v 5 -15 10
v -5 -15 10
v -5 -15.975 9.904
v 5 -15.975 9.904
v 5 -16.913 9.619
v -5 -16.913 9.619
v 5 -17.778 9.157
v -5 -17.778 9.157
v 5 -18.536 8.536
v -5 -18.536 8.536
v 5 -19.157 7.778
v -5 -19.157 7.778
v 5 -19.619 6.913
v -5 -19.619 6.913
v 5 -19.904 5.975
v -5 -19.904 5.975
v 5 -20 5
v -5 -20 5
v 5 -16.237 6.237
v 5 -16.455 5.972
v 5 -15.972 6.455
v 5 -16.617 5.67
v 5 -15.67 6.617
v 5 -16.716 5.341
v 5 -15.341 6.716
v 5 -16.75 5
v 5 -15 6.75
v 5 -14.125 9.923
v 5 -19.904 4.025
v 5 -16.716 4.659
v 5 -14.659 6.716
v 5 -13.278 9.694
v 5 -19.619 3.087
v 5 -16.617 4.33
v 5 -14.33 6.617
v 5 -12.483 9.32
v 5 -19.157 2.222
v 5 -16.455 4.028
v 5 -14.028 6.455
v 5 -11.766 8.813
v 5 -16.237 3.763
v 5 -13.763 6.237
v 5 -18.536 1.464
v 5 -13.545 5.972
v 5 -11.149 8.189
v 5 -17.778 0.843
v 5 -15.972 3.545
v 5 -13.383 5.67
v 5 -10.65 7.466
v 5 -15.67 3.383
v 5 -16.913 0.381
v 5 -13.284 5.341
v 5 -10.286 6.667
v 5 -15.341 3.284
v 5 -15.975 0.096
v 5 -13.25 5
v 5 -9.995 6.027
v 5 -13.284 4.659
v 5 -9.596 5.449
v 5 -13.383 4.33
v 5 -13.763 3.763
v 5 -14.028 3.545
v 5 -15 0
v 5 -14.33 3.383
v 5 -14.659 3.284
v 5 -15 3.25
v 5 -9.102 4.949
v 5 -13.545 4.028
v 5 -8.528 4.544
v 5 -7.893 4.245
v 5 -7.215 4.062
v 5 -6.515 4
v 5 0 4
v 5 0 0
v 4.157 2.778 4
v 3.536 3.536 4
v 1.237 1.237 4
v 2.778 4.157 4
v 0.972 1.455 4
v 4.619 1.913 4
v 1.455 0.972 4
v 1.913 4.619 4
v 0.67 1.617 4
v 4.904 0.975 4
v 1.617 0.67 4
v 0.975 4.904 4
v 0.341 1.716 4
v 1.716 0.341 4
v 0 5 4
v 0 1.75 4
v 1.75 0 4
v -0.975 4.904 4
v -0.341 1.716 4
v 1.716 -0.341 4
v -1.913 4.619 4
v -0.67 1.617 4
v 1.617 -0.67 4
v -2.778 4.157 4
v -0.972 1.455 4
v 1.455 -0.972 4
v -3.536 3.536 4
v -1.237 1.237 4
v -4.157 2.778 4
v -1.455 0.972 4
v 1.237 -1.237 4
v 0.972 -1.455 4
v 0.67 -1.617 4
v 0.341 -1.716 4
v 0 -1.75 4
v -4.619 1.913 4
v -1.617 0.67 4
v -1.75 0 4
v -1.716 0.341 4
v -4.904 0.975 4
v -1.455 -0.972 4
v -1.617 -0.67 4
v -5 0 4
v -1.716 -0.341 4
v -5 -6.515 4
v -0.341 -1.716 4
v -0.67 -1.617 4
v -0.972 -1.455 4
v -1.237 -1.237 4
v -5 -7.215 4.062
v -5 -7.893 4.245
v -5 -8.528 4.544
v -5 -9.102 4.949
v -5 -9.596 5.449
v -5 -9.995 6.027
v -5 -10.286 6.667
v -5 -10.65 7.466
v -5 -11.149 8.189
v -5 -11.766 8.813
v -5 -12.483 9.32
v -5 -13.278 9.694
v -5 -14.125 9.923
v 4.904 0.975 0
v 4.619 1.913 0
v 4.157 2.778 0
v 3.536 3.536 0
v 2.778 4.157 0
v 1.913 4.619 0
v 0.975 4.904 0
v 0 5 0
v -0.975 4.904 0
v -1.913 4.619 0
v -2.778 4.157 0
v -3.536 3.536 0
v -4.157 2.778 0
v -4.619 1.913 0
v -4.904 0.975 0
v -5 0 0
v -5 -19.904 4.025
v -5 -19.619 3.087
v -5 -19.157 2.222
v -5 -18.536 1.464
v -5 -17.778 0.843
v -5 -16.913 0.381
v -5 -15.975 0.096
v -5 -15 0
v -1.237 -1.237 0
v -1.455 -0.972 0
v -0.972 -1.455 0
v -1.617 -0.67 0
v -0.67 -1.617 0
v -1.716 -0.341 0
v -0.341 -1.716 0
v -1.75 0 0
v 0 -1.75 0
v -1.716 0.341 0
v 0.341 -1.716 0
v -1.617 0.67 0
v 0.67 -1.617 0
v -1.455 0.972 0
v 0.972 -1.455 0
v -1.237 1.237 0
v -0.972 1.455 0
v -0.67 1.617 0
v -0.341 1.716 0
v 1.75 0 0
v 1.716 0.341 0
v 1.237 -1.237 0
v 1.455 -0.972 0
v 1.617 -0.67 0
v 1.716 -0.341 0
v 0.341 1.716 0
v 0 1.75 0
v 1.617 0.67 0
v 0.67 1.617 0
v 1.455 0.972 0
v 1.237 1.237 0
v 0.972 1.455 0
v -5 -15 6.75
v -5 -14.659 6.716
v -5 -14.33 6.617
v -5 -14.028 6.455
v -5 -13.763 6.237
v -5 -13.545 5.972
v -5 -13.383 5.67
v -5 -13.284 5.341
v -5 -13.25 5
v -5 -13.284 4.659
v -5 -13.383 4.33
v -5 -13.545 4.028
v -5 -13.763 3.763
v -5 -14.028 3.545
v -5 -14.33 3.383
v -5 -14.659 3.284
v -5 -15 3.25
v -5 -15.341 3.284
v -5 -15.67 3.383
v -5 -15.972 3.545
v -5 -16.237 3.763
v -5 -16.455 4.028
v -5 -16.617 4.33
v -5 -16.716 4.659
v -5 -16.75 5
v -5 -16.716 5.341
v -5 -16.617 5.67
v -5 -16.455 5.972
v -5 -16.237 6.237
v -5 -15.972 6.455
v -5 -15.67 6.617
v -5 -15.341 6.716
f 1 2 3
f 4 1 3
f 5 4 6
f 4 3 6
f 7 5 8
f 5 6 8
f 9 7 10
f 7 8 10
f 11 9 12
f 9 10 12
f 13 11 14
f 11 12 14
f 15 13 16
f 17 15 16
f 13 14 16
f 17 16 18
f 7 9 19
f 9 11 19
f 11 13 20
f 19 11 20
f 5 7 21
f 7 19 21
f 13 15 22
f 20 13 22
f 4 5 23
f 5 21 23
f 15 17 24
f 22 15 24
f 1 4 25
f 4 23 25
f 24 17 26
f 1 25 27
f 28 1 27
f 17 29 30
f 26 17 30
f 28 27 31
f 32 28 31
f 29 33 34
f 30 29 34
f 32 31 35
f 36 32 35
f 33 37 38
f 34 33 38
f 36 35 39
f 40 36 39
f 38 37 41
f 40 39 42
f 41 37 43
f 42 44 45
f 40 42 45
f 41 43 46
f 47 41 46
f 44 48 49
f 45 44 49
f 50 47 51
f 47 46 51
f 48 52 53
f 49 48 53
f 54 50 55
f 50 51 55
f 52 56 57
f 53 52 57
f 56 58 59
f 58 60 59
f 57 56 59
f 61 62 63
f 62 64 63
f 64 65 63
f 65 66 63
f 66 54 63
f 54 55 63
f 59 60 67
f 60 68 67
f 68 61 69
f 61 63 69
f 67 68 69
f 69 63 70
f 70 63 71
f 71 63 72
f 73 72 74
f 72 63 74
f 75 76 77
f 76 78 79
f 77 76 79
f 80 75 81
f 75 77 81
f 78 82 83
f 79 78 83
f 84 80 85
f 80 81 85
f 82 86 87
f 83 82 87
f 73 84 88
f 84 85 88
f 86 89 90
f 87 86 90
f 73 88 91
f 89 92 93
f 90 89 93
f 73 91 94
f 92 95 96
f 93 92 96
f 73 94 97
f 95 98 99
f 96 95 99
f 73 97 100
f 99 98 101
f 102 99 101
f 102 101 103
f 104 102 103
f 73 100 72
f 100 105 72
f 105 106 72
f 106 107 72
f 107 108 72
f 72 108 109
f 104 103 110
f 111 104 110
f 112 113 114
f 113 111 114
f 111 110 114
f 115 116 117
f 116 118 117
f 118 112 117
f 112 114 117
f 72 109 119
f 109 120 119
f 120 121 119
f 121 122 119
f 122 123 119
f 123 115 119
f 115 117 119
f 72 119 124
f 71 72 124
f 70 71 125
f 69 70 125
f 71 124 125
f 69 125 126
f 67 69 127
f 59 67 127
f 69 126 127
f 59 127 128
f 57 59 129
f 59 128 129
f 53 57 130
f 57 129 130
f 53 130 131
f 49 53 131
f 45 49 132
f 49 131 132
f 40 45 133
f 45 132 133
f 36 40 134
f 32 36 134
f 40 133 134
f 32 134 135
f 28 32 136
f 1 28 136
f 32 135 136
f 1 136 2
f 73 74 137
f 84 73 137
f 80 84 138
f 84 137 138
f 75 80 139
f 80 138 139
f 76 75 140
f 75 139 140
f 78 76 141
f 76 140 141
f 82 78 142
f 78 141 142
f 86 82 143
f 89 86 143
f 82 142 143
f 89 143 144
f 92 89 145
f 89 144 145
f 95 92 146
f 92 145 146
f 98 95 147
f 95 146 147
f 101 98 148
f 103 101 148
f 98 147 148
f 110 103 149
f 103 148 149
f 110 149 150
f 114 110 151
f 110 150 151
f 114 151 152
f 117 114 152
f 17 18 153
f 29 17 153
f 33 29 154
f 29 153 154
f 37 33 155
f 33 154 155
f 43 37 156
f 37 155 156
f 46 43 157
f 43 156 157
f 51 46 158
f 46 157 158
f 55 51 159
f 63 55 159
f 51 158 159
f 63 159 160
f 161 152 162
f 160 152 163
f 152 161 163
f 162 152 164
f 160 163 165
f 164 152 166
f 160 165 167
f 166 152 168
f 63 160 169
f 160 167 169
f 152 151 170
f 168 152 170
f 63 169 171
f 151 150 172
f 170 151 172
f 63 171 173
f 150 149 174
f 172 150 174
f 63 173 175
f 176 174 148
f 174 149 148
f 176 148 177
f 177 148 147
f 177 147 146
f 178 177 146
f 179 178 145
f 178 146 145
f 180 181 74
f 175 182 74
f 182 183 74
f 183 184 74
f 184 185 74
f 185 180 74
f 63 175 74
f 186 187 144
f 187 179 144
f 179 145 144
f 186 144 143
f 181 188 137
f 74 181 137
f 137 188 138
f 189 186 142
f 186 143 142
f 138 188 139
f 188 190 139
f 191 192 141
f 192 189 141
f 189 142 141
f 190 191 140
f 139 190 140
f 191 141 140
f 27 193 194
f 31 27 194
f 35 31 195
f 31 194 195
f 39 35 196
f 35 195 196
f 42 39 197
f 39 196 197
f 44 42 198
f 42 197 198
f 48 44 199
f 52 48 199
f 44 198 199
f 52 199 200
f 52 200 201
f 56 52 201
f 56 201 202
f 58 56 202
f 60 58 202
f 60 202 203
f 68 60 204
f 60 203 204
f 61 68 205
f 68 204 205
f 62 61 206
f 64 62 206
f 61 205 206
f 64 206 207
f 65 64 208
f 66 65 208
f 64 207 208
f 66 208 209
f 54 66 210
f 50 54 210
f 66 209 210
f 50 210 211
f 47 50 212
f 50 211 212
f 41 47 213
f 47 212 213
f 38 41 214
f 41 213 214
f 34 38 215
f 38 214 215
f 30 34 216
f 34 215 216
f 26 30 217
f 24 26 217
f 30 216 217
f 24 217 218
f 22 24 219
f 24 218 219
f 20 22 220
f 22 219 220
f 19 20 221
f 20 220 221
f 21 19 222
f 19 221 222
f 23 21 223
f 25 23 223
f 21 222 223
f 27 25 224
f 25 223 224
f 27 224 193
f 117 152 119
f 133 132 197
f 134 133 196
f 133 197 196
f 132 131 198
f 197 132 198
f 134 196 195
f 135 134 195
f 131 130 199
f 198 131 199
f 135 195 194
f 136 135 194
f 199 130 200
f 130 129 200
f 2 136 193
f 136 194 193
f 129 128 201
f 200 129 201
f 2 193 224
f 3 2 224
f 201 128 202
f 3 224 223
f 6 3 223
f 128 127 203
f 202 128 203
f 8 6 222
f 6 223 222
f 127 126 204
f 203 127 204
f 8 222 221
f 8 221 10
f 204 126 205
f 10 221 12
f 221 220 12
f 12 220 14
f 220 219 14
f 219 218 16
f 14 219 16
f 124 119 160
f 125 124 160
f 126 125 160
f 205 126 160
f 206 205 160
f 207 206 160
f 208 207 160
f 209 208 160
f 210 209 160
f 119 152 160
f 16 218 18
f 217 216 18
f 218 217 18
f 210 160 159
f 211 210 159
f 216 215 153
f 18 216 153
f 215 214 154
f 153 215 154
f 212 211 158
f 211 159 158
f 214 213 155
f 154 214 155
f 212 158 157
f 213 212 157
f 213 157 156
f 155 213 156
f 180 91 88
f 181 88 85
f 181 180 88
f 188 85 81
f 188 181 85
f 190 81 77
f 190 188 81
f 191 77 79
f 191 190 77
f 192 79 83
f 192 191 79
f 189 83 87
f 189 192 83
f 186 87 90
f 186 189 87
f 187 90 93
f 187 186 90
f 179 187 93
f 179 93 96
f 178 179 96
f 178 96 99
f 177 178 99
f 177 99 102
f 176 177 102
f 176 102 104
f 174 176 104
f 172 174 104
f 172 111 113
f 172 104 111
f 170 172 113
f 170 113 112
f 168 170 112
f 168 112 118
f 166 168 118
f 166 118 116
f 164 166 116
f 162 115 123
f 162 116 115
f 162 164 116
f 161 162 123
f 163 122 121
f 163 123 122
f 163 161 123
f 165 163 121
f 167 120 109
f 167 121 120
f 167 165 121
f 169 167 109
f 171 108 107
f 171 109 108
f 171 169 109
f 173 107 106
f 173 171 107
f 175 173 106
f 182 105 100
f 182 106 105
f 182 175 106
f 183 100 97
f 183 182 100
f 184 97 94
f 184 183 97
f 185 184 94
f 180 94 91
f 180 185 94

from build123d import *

# Parameters (mm, degrees)
ESBO_O1_R                = 1.75
RESSALTO_EXTRUS_O1_DEPTH = 10
ESBO_O2_W                = 6
ESBO_O2_H                = 5
ESBO_O2_R                = 1.75
CORTE_EXTRUS_O1_DEPTH    = 10


with BuildPart() as part:
    # Esboço1 → Ressalto-extrusão1 (new body)
    with BuildSketch(Plane.XY):
        with BuildLine():
            Line((-5, 0), (-5, -20))
            Line((-5, -20), (5, -20))
            Line((5, -20), (5, 0))
            ThreePointArc((5, 0), (0, 5), (-5, 0))
        make_face()
        Circle(ESBO_O1_R, mode=Mode.SUBTRACT)
    extrude(amount=RESSALTO_EXTRUS_O1_DEPTH)

    # Esboço2 → Corte-extrusão1 (cut)
    with BuildSketch(Plane.ZY.offset(5)):
        with BuildLine():
            Line((10, 0), (4, 0))
            Line((4, 0), (4, -6.514718626))
            ThreePointArc((4, -6.514718626), (4.734013676, -8.824119703), (6.666666667, -10.285954792))
            ThreePointArc((6.666666667, -10.285954792), (9.082482905, -12.113248654), (10, -15))
            Line((10, -15), (10, 0))
        make_face()
        with Locations((7, 2.5)):
            Rectangle(ESBO_O2_W, ESBO_O2_H)
        with BuildLine():
            Line((10, -20), (10, -15))
            ThreePointArc((10, -15), (8.535533906, -18.535533906), (5, -20))
            Line((5, -20), (10, -20))
        make_face()
        with BuildLine():
            ThreePointArc((5, -20), (1.464466094, -18.535533906), (0, -15))
            Line((0, -15), (0, -20))
            Line((0, -20), (5, -20))
        make_face()
        with Locations((5, -15)):
            Circle(ESBO_O2_R)
    extrude(amount=-CORTE_EXTRUS_O1_DEPTH, mode=Mode.SUBTRACT)


solid = part.part
